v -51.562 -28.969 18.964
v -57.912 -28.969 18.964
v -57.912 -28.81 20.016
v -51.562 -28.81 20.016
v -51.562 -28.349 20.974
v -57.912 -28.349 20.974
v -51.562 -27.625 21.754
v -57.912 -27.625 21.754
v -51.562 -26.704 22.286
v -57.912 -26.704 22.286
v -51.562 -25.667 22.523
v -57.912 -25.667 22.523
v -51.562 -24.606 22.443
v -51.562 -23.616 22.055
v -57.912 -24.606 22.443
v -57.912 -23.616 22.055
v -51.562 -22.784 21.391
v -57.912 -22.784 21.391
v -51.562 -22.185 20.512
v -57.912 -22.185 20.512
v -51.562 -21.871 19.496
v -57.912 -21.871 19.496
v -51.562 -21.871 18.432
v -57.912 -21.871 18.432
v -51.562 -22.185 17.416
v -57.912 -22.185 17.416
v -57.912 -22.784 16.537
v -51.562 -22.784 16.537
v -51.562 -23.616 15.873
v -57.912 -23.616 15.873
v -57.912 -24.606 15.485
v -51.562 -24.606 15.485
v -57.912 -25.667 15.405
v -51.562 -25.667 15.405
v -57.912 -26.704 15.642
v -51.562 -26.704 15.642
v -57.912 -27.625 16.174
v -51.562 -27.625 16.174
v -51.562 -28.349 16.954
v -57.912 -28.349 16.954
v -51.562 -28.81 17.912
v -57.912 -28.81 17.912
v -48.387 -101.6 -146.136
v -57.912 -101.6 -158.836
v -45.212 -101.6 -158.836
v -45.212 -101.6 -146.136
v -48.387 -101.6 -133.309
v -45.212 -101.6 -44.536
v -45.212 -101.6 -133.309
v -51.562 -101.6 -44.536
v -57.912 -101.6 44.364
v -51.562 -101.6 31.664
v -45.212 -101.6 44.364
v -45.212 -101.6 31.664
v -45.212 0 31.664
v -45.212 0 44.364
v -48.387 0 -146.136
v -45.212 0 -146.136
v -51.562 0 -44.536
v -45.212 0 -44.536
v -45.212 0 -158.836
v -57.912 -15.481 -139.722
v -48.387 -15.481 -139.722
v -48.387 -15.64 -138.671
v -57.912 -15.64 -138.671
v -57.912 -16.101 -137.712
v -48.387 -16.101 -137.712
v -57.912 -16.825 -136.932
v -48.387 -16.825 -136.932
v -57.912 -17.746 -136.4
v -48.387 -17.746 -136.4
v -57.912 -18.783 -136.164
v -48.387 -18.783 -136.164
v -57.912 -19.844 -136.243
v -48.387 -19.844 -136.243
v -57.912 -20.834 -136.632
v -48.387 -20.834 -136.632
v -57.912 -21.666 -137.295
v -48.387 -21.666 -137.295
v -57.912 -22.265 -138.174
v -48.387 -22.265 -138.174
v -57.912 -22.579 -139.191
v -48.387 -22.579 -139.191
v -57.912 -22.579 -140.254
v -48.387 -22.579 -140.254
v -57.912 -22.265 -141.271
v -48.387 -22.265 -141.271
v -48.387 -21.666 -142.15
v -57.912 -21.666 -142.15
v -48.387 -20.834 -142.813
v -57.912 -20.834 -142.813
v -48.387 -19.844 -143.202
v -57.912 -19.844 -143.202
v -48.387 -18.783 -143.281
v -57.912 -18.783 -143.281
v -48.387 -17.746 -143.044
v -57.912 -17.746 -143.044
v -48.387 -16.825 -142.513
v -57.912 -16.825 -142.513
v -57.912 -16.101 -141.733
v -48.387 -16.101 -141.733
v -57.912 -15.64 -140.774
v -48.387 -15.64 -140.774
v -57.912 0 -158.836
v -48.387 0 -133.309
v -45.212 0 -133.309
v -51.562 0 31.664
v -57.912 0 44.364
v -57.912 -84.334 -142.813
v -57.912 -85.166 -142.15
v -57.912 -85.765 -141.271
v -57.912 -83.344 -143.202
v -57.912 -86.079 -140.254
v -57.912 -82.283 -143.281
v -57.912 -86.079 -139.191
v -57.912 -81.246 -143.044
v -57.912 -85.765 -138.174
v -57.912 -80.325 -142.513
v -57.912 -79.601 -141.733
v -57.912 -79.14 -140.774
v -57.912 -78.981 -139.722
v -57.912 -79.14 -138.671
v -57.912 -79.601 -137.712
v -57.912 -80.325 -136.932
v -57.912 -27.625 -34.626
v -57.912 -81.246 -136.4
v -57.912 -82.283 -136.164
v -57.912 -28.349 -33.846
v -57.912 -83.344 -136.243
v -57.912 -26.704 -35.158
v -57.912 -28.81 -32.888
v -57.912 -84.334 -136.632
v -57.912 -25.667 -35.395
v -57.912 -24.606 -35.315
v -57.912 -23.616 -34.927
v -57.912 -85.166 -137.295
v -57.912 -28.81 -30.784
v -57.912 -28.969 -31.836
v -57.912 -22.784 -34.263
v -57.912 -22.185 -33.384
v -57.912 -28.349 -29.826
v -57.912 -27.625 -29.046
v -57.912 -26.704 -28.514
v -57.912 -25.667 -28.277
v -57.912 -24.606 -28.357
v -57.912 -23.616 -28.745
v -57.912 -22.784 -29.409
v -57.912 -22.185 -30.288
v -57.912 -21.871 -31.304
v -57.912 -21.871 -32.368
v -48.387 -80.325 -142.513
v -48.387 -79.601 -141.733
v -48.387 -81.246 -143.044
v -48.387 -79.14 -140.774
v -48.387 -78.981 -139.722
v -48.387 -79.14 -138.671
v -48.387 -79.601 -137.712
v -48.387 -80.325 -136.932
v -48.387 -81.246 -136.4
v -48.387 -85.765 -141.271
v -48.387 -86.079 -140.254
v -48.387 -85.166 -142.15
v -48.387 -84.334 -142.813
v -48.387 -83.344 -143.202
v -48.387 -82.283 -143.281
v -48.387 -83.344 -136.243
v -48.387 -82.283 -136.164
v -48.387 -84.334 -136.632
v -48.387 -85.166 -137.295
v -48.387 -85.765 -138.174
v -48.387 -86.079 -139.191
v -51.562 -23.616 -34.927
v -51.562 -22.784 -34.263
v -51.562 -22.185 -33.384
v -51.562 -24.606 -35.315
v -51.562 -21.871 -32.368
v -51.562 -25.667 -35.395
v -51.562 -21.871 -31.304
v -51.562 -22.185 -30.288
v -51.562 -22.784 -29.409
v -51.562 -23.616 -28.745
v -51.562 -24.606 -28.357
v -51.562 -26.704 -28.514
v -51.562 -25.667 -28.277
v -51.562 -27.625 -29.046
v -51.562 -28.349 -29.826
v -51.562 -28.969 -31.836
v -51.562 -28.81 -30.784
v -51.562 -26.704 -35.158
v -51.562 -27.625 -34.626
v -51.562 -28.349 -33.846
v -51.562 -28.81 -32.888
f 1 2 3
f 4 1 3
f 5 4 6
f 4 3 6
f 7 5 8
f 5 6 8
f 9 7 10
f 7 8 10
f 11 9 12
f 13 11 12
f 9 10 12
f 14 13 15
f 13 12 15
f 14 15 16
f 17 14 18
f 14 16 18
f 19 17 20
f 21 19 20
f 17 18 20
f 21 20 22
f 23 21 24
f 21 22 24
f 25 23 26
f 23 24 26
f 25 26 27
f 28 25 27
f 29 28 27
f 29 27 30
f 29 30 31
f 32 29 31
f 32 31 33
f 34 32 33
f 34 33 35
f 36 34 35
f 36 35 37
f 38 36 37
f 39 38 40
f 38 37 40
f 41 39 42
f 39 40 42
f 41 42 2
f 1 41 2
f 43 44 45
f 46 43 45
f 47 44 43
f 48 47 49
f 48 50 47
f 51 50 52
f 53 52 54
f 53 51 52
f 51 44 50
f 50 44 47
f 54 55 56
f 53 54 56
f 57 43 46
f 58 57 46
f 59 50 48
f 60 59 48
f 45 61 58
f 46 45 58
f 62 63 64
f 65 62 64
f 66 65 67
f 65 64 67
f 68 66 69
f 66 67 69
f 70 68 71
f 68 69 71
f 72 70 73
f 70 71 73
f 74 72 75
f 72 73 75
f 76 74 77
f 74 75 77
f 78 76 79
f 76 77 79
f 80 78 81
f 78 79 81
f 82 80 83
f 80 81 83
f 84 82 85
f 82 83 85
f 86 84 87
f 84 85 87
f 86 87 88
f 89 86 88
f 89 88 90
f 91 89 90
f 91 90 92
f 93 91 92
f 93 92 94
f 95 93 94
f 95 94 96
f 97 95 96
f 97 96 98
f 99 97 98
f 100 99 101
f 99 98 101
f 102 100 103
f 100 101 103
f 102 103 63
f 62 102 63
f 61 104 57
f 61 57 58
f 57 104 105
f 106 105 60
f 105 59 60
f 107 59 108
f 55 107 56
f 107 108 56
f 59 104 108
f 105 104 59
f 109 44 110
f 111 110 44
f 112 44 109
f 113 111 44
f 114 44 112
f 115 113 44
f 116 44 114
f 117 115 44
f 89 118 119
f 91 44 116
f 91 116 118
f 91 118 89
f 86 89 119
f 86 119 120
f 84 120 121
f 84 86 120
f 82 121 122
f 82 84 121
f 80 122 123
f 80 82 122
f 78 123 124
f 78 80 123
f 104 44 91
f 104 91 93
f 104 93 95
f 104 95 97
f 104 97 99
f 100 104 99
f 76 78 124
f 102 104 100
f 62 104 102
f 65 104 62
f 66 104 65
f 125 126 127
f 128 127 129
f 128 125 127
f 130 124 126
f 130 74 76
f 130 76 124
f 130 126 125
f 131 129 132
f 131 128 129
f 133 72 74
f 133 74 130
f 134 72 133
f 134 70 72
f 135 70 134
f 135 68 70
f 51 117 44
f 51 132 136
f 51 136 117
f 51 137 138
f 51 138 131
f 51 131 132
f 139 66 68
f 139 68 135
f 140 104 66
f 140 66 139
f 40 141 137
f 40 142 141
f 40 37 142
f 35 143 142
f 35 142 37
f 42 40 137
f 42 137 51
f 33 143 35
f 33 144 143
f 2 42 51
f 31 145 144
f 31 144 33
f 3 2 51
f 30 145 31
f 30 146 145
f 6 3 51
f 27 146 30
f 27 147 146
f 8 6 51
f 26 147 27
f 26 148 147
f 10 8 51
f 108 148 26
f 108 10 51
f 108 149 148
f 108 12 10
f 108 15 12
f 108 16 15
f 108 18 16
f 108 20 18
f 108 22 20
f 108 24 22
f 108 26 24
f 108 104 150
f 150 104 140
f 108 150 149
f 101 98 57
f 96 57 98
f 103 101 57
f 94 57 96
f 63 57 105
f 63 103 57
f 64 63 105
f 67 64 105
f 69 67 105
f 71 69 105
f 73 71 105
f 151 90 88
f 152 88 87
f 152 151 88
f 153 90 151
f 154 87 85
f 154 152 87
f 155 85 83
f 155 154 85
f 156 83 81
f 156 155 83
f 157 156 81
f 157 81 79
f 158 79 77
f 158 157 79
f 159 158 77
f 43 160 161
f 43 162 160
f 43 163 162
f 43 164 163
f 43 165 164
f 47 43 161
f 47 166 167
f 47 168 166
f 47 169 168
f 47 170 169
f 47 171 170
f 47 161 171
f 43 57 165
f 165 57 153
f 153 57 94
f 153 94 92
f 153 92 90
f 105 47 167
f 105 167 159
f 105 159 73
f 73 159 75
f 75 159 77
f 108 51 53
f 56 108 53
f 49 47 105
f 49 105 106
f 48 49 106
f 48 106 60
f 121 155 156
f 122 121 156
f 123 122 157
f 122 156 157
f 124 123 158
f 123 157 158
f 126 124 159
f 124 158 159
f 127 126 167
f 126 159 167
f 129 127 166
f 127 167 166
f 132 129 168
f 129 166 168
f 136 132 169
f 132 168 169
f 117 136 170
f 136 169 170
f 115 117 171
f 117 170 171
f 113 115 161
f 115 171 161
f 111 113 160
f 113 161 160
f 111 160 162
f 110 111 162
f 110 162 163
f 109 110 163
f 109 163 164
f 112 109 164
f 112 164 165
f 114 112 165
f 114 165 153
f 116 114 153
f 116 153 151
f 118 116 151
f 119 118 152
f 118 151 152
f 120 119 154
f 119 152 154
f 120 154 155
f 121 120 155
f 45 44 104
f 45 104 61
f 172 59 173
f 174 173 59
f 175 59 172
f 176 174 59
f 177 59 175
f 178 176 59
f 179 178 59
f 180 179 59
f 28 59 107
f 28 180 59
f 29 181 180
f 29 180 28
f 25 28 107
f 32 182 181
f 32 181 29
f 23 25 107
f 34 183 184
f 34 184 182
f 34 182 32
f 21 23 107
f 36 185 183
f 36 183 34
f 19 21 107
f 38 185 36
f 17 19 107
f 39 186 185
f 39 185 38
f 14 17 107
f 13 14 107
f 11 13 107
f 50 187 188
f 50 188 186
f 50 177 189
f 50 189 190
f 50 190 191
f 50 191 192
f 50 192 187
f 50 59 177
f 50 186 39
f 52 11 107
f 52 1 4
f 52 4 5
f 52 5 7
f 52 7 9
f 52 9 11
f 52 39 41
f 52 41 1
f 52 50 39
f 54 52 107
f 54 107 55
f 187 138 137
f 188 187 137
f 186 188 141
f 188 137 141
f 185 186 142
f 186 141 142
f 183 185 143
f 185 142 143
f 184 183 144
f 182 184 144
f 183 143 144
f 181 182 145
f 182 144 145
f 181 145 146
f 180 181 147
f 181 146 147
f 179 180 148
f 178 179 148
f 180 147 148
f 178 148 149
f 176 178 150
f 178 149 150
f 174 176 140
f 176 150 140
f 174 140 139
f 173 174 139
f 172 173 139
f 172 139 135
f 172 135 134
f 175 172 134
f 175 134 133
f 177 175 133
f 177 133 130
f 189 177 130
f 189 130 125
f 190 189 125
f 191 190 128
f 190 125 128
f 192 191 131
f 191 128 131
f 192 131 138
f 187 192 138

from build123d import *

# Parameters (mm, degrees)
F0_W     = 12.7
F0_H     = 203.2
F1_DEPTH = 101.6
F2_W     = 3.175
F2_H     = 12.827
F3_DEPTH = 101.6
F4_R     = 3.5687
F5_DEPTH = 9.525
F6_W     = 6.35
F6_H     = 76.2
F7_DEPTH = 101.6
F8_R     = 3.5687
F9_DEPTH = 6.35


with BuildPart() as f1:
    # F0 (on Front) → F1 (new body)
    with BuildSketch(Plane.XZ):
        with Locations((-51.562002, -57.235944)):
            Rectangle(F0_W, F0_H)
    extrude(amount=F1_DEPTH)

    # F2 (on face) → F3 (cut, through all)
    with BuildSketch(Plane.XZ.offset(101.6)):
        with Locations((-46.799502, -139.722444)):
            Rectangle(F2_W, F2_H)
    extrude(amount=-F3_DEPTH, mode=Mode.SUBTRACT)

    # F4 (on face) → F5 (cut, through all)
    with BuildSketch(Plane.YZ.offset(-48.387002)):
        with Locations((-82.55, -139.722444)):
            Circle(F4_R)
        with Locations((-19.05, -139.722444)):
            Circle(F4_R)
    extrude(amount=-F5_DEPTH, mode=Mode.SUBTRACT)

    # F6 (on face) → F7 (cut, through all)
    with BuildSketch(Plane.XZ.offset(101.6)):
        with Locations((-48.387002, -6.435944)):
            Rectangle(F6_W, F6_H)
    extrude(amount=-F7_DEPTH, mode=Mode.SUBTRACT)

    # F8 (on face) → F9 (cut, through all)
    with BuildSketch(Plane(origin=(-57.912002, 0, 0), x_dir=(0, -1, 0), z_dir=(-1, 0, 0))):
        with Locations((25.4, 18.964056)):
            Circle(F8_R)
        with Locations((25.4, -31.835944)):
            Circle(F8_R)
    extrude(amount=-F9_DEPTH, mode=Mode.SUBTRACT)


solid = f1.part
